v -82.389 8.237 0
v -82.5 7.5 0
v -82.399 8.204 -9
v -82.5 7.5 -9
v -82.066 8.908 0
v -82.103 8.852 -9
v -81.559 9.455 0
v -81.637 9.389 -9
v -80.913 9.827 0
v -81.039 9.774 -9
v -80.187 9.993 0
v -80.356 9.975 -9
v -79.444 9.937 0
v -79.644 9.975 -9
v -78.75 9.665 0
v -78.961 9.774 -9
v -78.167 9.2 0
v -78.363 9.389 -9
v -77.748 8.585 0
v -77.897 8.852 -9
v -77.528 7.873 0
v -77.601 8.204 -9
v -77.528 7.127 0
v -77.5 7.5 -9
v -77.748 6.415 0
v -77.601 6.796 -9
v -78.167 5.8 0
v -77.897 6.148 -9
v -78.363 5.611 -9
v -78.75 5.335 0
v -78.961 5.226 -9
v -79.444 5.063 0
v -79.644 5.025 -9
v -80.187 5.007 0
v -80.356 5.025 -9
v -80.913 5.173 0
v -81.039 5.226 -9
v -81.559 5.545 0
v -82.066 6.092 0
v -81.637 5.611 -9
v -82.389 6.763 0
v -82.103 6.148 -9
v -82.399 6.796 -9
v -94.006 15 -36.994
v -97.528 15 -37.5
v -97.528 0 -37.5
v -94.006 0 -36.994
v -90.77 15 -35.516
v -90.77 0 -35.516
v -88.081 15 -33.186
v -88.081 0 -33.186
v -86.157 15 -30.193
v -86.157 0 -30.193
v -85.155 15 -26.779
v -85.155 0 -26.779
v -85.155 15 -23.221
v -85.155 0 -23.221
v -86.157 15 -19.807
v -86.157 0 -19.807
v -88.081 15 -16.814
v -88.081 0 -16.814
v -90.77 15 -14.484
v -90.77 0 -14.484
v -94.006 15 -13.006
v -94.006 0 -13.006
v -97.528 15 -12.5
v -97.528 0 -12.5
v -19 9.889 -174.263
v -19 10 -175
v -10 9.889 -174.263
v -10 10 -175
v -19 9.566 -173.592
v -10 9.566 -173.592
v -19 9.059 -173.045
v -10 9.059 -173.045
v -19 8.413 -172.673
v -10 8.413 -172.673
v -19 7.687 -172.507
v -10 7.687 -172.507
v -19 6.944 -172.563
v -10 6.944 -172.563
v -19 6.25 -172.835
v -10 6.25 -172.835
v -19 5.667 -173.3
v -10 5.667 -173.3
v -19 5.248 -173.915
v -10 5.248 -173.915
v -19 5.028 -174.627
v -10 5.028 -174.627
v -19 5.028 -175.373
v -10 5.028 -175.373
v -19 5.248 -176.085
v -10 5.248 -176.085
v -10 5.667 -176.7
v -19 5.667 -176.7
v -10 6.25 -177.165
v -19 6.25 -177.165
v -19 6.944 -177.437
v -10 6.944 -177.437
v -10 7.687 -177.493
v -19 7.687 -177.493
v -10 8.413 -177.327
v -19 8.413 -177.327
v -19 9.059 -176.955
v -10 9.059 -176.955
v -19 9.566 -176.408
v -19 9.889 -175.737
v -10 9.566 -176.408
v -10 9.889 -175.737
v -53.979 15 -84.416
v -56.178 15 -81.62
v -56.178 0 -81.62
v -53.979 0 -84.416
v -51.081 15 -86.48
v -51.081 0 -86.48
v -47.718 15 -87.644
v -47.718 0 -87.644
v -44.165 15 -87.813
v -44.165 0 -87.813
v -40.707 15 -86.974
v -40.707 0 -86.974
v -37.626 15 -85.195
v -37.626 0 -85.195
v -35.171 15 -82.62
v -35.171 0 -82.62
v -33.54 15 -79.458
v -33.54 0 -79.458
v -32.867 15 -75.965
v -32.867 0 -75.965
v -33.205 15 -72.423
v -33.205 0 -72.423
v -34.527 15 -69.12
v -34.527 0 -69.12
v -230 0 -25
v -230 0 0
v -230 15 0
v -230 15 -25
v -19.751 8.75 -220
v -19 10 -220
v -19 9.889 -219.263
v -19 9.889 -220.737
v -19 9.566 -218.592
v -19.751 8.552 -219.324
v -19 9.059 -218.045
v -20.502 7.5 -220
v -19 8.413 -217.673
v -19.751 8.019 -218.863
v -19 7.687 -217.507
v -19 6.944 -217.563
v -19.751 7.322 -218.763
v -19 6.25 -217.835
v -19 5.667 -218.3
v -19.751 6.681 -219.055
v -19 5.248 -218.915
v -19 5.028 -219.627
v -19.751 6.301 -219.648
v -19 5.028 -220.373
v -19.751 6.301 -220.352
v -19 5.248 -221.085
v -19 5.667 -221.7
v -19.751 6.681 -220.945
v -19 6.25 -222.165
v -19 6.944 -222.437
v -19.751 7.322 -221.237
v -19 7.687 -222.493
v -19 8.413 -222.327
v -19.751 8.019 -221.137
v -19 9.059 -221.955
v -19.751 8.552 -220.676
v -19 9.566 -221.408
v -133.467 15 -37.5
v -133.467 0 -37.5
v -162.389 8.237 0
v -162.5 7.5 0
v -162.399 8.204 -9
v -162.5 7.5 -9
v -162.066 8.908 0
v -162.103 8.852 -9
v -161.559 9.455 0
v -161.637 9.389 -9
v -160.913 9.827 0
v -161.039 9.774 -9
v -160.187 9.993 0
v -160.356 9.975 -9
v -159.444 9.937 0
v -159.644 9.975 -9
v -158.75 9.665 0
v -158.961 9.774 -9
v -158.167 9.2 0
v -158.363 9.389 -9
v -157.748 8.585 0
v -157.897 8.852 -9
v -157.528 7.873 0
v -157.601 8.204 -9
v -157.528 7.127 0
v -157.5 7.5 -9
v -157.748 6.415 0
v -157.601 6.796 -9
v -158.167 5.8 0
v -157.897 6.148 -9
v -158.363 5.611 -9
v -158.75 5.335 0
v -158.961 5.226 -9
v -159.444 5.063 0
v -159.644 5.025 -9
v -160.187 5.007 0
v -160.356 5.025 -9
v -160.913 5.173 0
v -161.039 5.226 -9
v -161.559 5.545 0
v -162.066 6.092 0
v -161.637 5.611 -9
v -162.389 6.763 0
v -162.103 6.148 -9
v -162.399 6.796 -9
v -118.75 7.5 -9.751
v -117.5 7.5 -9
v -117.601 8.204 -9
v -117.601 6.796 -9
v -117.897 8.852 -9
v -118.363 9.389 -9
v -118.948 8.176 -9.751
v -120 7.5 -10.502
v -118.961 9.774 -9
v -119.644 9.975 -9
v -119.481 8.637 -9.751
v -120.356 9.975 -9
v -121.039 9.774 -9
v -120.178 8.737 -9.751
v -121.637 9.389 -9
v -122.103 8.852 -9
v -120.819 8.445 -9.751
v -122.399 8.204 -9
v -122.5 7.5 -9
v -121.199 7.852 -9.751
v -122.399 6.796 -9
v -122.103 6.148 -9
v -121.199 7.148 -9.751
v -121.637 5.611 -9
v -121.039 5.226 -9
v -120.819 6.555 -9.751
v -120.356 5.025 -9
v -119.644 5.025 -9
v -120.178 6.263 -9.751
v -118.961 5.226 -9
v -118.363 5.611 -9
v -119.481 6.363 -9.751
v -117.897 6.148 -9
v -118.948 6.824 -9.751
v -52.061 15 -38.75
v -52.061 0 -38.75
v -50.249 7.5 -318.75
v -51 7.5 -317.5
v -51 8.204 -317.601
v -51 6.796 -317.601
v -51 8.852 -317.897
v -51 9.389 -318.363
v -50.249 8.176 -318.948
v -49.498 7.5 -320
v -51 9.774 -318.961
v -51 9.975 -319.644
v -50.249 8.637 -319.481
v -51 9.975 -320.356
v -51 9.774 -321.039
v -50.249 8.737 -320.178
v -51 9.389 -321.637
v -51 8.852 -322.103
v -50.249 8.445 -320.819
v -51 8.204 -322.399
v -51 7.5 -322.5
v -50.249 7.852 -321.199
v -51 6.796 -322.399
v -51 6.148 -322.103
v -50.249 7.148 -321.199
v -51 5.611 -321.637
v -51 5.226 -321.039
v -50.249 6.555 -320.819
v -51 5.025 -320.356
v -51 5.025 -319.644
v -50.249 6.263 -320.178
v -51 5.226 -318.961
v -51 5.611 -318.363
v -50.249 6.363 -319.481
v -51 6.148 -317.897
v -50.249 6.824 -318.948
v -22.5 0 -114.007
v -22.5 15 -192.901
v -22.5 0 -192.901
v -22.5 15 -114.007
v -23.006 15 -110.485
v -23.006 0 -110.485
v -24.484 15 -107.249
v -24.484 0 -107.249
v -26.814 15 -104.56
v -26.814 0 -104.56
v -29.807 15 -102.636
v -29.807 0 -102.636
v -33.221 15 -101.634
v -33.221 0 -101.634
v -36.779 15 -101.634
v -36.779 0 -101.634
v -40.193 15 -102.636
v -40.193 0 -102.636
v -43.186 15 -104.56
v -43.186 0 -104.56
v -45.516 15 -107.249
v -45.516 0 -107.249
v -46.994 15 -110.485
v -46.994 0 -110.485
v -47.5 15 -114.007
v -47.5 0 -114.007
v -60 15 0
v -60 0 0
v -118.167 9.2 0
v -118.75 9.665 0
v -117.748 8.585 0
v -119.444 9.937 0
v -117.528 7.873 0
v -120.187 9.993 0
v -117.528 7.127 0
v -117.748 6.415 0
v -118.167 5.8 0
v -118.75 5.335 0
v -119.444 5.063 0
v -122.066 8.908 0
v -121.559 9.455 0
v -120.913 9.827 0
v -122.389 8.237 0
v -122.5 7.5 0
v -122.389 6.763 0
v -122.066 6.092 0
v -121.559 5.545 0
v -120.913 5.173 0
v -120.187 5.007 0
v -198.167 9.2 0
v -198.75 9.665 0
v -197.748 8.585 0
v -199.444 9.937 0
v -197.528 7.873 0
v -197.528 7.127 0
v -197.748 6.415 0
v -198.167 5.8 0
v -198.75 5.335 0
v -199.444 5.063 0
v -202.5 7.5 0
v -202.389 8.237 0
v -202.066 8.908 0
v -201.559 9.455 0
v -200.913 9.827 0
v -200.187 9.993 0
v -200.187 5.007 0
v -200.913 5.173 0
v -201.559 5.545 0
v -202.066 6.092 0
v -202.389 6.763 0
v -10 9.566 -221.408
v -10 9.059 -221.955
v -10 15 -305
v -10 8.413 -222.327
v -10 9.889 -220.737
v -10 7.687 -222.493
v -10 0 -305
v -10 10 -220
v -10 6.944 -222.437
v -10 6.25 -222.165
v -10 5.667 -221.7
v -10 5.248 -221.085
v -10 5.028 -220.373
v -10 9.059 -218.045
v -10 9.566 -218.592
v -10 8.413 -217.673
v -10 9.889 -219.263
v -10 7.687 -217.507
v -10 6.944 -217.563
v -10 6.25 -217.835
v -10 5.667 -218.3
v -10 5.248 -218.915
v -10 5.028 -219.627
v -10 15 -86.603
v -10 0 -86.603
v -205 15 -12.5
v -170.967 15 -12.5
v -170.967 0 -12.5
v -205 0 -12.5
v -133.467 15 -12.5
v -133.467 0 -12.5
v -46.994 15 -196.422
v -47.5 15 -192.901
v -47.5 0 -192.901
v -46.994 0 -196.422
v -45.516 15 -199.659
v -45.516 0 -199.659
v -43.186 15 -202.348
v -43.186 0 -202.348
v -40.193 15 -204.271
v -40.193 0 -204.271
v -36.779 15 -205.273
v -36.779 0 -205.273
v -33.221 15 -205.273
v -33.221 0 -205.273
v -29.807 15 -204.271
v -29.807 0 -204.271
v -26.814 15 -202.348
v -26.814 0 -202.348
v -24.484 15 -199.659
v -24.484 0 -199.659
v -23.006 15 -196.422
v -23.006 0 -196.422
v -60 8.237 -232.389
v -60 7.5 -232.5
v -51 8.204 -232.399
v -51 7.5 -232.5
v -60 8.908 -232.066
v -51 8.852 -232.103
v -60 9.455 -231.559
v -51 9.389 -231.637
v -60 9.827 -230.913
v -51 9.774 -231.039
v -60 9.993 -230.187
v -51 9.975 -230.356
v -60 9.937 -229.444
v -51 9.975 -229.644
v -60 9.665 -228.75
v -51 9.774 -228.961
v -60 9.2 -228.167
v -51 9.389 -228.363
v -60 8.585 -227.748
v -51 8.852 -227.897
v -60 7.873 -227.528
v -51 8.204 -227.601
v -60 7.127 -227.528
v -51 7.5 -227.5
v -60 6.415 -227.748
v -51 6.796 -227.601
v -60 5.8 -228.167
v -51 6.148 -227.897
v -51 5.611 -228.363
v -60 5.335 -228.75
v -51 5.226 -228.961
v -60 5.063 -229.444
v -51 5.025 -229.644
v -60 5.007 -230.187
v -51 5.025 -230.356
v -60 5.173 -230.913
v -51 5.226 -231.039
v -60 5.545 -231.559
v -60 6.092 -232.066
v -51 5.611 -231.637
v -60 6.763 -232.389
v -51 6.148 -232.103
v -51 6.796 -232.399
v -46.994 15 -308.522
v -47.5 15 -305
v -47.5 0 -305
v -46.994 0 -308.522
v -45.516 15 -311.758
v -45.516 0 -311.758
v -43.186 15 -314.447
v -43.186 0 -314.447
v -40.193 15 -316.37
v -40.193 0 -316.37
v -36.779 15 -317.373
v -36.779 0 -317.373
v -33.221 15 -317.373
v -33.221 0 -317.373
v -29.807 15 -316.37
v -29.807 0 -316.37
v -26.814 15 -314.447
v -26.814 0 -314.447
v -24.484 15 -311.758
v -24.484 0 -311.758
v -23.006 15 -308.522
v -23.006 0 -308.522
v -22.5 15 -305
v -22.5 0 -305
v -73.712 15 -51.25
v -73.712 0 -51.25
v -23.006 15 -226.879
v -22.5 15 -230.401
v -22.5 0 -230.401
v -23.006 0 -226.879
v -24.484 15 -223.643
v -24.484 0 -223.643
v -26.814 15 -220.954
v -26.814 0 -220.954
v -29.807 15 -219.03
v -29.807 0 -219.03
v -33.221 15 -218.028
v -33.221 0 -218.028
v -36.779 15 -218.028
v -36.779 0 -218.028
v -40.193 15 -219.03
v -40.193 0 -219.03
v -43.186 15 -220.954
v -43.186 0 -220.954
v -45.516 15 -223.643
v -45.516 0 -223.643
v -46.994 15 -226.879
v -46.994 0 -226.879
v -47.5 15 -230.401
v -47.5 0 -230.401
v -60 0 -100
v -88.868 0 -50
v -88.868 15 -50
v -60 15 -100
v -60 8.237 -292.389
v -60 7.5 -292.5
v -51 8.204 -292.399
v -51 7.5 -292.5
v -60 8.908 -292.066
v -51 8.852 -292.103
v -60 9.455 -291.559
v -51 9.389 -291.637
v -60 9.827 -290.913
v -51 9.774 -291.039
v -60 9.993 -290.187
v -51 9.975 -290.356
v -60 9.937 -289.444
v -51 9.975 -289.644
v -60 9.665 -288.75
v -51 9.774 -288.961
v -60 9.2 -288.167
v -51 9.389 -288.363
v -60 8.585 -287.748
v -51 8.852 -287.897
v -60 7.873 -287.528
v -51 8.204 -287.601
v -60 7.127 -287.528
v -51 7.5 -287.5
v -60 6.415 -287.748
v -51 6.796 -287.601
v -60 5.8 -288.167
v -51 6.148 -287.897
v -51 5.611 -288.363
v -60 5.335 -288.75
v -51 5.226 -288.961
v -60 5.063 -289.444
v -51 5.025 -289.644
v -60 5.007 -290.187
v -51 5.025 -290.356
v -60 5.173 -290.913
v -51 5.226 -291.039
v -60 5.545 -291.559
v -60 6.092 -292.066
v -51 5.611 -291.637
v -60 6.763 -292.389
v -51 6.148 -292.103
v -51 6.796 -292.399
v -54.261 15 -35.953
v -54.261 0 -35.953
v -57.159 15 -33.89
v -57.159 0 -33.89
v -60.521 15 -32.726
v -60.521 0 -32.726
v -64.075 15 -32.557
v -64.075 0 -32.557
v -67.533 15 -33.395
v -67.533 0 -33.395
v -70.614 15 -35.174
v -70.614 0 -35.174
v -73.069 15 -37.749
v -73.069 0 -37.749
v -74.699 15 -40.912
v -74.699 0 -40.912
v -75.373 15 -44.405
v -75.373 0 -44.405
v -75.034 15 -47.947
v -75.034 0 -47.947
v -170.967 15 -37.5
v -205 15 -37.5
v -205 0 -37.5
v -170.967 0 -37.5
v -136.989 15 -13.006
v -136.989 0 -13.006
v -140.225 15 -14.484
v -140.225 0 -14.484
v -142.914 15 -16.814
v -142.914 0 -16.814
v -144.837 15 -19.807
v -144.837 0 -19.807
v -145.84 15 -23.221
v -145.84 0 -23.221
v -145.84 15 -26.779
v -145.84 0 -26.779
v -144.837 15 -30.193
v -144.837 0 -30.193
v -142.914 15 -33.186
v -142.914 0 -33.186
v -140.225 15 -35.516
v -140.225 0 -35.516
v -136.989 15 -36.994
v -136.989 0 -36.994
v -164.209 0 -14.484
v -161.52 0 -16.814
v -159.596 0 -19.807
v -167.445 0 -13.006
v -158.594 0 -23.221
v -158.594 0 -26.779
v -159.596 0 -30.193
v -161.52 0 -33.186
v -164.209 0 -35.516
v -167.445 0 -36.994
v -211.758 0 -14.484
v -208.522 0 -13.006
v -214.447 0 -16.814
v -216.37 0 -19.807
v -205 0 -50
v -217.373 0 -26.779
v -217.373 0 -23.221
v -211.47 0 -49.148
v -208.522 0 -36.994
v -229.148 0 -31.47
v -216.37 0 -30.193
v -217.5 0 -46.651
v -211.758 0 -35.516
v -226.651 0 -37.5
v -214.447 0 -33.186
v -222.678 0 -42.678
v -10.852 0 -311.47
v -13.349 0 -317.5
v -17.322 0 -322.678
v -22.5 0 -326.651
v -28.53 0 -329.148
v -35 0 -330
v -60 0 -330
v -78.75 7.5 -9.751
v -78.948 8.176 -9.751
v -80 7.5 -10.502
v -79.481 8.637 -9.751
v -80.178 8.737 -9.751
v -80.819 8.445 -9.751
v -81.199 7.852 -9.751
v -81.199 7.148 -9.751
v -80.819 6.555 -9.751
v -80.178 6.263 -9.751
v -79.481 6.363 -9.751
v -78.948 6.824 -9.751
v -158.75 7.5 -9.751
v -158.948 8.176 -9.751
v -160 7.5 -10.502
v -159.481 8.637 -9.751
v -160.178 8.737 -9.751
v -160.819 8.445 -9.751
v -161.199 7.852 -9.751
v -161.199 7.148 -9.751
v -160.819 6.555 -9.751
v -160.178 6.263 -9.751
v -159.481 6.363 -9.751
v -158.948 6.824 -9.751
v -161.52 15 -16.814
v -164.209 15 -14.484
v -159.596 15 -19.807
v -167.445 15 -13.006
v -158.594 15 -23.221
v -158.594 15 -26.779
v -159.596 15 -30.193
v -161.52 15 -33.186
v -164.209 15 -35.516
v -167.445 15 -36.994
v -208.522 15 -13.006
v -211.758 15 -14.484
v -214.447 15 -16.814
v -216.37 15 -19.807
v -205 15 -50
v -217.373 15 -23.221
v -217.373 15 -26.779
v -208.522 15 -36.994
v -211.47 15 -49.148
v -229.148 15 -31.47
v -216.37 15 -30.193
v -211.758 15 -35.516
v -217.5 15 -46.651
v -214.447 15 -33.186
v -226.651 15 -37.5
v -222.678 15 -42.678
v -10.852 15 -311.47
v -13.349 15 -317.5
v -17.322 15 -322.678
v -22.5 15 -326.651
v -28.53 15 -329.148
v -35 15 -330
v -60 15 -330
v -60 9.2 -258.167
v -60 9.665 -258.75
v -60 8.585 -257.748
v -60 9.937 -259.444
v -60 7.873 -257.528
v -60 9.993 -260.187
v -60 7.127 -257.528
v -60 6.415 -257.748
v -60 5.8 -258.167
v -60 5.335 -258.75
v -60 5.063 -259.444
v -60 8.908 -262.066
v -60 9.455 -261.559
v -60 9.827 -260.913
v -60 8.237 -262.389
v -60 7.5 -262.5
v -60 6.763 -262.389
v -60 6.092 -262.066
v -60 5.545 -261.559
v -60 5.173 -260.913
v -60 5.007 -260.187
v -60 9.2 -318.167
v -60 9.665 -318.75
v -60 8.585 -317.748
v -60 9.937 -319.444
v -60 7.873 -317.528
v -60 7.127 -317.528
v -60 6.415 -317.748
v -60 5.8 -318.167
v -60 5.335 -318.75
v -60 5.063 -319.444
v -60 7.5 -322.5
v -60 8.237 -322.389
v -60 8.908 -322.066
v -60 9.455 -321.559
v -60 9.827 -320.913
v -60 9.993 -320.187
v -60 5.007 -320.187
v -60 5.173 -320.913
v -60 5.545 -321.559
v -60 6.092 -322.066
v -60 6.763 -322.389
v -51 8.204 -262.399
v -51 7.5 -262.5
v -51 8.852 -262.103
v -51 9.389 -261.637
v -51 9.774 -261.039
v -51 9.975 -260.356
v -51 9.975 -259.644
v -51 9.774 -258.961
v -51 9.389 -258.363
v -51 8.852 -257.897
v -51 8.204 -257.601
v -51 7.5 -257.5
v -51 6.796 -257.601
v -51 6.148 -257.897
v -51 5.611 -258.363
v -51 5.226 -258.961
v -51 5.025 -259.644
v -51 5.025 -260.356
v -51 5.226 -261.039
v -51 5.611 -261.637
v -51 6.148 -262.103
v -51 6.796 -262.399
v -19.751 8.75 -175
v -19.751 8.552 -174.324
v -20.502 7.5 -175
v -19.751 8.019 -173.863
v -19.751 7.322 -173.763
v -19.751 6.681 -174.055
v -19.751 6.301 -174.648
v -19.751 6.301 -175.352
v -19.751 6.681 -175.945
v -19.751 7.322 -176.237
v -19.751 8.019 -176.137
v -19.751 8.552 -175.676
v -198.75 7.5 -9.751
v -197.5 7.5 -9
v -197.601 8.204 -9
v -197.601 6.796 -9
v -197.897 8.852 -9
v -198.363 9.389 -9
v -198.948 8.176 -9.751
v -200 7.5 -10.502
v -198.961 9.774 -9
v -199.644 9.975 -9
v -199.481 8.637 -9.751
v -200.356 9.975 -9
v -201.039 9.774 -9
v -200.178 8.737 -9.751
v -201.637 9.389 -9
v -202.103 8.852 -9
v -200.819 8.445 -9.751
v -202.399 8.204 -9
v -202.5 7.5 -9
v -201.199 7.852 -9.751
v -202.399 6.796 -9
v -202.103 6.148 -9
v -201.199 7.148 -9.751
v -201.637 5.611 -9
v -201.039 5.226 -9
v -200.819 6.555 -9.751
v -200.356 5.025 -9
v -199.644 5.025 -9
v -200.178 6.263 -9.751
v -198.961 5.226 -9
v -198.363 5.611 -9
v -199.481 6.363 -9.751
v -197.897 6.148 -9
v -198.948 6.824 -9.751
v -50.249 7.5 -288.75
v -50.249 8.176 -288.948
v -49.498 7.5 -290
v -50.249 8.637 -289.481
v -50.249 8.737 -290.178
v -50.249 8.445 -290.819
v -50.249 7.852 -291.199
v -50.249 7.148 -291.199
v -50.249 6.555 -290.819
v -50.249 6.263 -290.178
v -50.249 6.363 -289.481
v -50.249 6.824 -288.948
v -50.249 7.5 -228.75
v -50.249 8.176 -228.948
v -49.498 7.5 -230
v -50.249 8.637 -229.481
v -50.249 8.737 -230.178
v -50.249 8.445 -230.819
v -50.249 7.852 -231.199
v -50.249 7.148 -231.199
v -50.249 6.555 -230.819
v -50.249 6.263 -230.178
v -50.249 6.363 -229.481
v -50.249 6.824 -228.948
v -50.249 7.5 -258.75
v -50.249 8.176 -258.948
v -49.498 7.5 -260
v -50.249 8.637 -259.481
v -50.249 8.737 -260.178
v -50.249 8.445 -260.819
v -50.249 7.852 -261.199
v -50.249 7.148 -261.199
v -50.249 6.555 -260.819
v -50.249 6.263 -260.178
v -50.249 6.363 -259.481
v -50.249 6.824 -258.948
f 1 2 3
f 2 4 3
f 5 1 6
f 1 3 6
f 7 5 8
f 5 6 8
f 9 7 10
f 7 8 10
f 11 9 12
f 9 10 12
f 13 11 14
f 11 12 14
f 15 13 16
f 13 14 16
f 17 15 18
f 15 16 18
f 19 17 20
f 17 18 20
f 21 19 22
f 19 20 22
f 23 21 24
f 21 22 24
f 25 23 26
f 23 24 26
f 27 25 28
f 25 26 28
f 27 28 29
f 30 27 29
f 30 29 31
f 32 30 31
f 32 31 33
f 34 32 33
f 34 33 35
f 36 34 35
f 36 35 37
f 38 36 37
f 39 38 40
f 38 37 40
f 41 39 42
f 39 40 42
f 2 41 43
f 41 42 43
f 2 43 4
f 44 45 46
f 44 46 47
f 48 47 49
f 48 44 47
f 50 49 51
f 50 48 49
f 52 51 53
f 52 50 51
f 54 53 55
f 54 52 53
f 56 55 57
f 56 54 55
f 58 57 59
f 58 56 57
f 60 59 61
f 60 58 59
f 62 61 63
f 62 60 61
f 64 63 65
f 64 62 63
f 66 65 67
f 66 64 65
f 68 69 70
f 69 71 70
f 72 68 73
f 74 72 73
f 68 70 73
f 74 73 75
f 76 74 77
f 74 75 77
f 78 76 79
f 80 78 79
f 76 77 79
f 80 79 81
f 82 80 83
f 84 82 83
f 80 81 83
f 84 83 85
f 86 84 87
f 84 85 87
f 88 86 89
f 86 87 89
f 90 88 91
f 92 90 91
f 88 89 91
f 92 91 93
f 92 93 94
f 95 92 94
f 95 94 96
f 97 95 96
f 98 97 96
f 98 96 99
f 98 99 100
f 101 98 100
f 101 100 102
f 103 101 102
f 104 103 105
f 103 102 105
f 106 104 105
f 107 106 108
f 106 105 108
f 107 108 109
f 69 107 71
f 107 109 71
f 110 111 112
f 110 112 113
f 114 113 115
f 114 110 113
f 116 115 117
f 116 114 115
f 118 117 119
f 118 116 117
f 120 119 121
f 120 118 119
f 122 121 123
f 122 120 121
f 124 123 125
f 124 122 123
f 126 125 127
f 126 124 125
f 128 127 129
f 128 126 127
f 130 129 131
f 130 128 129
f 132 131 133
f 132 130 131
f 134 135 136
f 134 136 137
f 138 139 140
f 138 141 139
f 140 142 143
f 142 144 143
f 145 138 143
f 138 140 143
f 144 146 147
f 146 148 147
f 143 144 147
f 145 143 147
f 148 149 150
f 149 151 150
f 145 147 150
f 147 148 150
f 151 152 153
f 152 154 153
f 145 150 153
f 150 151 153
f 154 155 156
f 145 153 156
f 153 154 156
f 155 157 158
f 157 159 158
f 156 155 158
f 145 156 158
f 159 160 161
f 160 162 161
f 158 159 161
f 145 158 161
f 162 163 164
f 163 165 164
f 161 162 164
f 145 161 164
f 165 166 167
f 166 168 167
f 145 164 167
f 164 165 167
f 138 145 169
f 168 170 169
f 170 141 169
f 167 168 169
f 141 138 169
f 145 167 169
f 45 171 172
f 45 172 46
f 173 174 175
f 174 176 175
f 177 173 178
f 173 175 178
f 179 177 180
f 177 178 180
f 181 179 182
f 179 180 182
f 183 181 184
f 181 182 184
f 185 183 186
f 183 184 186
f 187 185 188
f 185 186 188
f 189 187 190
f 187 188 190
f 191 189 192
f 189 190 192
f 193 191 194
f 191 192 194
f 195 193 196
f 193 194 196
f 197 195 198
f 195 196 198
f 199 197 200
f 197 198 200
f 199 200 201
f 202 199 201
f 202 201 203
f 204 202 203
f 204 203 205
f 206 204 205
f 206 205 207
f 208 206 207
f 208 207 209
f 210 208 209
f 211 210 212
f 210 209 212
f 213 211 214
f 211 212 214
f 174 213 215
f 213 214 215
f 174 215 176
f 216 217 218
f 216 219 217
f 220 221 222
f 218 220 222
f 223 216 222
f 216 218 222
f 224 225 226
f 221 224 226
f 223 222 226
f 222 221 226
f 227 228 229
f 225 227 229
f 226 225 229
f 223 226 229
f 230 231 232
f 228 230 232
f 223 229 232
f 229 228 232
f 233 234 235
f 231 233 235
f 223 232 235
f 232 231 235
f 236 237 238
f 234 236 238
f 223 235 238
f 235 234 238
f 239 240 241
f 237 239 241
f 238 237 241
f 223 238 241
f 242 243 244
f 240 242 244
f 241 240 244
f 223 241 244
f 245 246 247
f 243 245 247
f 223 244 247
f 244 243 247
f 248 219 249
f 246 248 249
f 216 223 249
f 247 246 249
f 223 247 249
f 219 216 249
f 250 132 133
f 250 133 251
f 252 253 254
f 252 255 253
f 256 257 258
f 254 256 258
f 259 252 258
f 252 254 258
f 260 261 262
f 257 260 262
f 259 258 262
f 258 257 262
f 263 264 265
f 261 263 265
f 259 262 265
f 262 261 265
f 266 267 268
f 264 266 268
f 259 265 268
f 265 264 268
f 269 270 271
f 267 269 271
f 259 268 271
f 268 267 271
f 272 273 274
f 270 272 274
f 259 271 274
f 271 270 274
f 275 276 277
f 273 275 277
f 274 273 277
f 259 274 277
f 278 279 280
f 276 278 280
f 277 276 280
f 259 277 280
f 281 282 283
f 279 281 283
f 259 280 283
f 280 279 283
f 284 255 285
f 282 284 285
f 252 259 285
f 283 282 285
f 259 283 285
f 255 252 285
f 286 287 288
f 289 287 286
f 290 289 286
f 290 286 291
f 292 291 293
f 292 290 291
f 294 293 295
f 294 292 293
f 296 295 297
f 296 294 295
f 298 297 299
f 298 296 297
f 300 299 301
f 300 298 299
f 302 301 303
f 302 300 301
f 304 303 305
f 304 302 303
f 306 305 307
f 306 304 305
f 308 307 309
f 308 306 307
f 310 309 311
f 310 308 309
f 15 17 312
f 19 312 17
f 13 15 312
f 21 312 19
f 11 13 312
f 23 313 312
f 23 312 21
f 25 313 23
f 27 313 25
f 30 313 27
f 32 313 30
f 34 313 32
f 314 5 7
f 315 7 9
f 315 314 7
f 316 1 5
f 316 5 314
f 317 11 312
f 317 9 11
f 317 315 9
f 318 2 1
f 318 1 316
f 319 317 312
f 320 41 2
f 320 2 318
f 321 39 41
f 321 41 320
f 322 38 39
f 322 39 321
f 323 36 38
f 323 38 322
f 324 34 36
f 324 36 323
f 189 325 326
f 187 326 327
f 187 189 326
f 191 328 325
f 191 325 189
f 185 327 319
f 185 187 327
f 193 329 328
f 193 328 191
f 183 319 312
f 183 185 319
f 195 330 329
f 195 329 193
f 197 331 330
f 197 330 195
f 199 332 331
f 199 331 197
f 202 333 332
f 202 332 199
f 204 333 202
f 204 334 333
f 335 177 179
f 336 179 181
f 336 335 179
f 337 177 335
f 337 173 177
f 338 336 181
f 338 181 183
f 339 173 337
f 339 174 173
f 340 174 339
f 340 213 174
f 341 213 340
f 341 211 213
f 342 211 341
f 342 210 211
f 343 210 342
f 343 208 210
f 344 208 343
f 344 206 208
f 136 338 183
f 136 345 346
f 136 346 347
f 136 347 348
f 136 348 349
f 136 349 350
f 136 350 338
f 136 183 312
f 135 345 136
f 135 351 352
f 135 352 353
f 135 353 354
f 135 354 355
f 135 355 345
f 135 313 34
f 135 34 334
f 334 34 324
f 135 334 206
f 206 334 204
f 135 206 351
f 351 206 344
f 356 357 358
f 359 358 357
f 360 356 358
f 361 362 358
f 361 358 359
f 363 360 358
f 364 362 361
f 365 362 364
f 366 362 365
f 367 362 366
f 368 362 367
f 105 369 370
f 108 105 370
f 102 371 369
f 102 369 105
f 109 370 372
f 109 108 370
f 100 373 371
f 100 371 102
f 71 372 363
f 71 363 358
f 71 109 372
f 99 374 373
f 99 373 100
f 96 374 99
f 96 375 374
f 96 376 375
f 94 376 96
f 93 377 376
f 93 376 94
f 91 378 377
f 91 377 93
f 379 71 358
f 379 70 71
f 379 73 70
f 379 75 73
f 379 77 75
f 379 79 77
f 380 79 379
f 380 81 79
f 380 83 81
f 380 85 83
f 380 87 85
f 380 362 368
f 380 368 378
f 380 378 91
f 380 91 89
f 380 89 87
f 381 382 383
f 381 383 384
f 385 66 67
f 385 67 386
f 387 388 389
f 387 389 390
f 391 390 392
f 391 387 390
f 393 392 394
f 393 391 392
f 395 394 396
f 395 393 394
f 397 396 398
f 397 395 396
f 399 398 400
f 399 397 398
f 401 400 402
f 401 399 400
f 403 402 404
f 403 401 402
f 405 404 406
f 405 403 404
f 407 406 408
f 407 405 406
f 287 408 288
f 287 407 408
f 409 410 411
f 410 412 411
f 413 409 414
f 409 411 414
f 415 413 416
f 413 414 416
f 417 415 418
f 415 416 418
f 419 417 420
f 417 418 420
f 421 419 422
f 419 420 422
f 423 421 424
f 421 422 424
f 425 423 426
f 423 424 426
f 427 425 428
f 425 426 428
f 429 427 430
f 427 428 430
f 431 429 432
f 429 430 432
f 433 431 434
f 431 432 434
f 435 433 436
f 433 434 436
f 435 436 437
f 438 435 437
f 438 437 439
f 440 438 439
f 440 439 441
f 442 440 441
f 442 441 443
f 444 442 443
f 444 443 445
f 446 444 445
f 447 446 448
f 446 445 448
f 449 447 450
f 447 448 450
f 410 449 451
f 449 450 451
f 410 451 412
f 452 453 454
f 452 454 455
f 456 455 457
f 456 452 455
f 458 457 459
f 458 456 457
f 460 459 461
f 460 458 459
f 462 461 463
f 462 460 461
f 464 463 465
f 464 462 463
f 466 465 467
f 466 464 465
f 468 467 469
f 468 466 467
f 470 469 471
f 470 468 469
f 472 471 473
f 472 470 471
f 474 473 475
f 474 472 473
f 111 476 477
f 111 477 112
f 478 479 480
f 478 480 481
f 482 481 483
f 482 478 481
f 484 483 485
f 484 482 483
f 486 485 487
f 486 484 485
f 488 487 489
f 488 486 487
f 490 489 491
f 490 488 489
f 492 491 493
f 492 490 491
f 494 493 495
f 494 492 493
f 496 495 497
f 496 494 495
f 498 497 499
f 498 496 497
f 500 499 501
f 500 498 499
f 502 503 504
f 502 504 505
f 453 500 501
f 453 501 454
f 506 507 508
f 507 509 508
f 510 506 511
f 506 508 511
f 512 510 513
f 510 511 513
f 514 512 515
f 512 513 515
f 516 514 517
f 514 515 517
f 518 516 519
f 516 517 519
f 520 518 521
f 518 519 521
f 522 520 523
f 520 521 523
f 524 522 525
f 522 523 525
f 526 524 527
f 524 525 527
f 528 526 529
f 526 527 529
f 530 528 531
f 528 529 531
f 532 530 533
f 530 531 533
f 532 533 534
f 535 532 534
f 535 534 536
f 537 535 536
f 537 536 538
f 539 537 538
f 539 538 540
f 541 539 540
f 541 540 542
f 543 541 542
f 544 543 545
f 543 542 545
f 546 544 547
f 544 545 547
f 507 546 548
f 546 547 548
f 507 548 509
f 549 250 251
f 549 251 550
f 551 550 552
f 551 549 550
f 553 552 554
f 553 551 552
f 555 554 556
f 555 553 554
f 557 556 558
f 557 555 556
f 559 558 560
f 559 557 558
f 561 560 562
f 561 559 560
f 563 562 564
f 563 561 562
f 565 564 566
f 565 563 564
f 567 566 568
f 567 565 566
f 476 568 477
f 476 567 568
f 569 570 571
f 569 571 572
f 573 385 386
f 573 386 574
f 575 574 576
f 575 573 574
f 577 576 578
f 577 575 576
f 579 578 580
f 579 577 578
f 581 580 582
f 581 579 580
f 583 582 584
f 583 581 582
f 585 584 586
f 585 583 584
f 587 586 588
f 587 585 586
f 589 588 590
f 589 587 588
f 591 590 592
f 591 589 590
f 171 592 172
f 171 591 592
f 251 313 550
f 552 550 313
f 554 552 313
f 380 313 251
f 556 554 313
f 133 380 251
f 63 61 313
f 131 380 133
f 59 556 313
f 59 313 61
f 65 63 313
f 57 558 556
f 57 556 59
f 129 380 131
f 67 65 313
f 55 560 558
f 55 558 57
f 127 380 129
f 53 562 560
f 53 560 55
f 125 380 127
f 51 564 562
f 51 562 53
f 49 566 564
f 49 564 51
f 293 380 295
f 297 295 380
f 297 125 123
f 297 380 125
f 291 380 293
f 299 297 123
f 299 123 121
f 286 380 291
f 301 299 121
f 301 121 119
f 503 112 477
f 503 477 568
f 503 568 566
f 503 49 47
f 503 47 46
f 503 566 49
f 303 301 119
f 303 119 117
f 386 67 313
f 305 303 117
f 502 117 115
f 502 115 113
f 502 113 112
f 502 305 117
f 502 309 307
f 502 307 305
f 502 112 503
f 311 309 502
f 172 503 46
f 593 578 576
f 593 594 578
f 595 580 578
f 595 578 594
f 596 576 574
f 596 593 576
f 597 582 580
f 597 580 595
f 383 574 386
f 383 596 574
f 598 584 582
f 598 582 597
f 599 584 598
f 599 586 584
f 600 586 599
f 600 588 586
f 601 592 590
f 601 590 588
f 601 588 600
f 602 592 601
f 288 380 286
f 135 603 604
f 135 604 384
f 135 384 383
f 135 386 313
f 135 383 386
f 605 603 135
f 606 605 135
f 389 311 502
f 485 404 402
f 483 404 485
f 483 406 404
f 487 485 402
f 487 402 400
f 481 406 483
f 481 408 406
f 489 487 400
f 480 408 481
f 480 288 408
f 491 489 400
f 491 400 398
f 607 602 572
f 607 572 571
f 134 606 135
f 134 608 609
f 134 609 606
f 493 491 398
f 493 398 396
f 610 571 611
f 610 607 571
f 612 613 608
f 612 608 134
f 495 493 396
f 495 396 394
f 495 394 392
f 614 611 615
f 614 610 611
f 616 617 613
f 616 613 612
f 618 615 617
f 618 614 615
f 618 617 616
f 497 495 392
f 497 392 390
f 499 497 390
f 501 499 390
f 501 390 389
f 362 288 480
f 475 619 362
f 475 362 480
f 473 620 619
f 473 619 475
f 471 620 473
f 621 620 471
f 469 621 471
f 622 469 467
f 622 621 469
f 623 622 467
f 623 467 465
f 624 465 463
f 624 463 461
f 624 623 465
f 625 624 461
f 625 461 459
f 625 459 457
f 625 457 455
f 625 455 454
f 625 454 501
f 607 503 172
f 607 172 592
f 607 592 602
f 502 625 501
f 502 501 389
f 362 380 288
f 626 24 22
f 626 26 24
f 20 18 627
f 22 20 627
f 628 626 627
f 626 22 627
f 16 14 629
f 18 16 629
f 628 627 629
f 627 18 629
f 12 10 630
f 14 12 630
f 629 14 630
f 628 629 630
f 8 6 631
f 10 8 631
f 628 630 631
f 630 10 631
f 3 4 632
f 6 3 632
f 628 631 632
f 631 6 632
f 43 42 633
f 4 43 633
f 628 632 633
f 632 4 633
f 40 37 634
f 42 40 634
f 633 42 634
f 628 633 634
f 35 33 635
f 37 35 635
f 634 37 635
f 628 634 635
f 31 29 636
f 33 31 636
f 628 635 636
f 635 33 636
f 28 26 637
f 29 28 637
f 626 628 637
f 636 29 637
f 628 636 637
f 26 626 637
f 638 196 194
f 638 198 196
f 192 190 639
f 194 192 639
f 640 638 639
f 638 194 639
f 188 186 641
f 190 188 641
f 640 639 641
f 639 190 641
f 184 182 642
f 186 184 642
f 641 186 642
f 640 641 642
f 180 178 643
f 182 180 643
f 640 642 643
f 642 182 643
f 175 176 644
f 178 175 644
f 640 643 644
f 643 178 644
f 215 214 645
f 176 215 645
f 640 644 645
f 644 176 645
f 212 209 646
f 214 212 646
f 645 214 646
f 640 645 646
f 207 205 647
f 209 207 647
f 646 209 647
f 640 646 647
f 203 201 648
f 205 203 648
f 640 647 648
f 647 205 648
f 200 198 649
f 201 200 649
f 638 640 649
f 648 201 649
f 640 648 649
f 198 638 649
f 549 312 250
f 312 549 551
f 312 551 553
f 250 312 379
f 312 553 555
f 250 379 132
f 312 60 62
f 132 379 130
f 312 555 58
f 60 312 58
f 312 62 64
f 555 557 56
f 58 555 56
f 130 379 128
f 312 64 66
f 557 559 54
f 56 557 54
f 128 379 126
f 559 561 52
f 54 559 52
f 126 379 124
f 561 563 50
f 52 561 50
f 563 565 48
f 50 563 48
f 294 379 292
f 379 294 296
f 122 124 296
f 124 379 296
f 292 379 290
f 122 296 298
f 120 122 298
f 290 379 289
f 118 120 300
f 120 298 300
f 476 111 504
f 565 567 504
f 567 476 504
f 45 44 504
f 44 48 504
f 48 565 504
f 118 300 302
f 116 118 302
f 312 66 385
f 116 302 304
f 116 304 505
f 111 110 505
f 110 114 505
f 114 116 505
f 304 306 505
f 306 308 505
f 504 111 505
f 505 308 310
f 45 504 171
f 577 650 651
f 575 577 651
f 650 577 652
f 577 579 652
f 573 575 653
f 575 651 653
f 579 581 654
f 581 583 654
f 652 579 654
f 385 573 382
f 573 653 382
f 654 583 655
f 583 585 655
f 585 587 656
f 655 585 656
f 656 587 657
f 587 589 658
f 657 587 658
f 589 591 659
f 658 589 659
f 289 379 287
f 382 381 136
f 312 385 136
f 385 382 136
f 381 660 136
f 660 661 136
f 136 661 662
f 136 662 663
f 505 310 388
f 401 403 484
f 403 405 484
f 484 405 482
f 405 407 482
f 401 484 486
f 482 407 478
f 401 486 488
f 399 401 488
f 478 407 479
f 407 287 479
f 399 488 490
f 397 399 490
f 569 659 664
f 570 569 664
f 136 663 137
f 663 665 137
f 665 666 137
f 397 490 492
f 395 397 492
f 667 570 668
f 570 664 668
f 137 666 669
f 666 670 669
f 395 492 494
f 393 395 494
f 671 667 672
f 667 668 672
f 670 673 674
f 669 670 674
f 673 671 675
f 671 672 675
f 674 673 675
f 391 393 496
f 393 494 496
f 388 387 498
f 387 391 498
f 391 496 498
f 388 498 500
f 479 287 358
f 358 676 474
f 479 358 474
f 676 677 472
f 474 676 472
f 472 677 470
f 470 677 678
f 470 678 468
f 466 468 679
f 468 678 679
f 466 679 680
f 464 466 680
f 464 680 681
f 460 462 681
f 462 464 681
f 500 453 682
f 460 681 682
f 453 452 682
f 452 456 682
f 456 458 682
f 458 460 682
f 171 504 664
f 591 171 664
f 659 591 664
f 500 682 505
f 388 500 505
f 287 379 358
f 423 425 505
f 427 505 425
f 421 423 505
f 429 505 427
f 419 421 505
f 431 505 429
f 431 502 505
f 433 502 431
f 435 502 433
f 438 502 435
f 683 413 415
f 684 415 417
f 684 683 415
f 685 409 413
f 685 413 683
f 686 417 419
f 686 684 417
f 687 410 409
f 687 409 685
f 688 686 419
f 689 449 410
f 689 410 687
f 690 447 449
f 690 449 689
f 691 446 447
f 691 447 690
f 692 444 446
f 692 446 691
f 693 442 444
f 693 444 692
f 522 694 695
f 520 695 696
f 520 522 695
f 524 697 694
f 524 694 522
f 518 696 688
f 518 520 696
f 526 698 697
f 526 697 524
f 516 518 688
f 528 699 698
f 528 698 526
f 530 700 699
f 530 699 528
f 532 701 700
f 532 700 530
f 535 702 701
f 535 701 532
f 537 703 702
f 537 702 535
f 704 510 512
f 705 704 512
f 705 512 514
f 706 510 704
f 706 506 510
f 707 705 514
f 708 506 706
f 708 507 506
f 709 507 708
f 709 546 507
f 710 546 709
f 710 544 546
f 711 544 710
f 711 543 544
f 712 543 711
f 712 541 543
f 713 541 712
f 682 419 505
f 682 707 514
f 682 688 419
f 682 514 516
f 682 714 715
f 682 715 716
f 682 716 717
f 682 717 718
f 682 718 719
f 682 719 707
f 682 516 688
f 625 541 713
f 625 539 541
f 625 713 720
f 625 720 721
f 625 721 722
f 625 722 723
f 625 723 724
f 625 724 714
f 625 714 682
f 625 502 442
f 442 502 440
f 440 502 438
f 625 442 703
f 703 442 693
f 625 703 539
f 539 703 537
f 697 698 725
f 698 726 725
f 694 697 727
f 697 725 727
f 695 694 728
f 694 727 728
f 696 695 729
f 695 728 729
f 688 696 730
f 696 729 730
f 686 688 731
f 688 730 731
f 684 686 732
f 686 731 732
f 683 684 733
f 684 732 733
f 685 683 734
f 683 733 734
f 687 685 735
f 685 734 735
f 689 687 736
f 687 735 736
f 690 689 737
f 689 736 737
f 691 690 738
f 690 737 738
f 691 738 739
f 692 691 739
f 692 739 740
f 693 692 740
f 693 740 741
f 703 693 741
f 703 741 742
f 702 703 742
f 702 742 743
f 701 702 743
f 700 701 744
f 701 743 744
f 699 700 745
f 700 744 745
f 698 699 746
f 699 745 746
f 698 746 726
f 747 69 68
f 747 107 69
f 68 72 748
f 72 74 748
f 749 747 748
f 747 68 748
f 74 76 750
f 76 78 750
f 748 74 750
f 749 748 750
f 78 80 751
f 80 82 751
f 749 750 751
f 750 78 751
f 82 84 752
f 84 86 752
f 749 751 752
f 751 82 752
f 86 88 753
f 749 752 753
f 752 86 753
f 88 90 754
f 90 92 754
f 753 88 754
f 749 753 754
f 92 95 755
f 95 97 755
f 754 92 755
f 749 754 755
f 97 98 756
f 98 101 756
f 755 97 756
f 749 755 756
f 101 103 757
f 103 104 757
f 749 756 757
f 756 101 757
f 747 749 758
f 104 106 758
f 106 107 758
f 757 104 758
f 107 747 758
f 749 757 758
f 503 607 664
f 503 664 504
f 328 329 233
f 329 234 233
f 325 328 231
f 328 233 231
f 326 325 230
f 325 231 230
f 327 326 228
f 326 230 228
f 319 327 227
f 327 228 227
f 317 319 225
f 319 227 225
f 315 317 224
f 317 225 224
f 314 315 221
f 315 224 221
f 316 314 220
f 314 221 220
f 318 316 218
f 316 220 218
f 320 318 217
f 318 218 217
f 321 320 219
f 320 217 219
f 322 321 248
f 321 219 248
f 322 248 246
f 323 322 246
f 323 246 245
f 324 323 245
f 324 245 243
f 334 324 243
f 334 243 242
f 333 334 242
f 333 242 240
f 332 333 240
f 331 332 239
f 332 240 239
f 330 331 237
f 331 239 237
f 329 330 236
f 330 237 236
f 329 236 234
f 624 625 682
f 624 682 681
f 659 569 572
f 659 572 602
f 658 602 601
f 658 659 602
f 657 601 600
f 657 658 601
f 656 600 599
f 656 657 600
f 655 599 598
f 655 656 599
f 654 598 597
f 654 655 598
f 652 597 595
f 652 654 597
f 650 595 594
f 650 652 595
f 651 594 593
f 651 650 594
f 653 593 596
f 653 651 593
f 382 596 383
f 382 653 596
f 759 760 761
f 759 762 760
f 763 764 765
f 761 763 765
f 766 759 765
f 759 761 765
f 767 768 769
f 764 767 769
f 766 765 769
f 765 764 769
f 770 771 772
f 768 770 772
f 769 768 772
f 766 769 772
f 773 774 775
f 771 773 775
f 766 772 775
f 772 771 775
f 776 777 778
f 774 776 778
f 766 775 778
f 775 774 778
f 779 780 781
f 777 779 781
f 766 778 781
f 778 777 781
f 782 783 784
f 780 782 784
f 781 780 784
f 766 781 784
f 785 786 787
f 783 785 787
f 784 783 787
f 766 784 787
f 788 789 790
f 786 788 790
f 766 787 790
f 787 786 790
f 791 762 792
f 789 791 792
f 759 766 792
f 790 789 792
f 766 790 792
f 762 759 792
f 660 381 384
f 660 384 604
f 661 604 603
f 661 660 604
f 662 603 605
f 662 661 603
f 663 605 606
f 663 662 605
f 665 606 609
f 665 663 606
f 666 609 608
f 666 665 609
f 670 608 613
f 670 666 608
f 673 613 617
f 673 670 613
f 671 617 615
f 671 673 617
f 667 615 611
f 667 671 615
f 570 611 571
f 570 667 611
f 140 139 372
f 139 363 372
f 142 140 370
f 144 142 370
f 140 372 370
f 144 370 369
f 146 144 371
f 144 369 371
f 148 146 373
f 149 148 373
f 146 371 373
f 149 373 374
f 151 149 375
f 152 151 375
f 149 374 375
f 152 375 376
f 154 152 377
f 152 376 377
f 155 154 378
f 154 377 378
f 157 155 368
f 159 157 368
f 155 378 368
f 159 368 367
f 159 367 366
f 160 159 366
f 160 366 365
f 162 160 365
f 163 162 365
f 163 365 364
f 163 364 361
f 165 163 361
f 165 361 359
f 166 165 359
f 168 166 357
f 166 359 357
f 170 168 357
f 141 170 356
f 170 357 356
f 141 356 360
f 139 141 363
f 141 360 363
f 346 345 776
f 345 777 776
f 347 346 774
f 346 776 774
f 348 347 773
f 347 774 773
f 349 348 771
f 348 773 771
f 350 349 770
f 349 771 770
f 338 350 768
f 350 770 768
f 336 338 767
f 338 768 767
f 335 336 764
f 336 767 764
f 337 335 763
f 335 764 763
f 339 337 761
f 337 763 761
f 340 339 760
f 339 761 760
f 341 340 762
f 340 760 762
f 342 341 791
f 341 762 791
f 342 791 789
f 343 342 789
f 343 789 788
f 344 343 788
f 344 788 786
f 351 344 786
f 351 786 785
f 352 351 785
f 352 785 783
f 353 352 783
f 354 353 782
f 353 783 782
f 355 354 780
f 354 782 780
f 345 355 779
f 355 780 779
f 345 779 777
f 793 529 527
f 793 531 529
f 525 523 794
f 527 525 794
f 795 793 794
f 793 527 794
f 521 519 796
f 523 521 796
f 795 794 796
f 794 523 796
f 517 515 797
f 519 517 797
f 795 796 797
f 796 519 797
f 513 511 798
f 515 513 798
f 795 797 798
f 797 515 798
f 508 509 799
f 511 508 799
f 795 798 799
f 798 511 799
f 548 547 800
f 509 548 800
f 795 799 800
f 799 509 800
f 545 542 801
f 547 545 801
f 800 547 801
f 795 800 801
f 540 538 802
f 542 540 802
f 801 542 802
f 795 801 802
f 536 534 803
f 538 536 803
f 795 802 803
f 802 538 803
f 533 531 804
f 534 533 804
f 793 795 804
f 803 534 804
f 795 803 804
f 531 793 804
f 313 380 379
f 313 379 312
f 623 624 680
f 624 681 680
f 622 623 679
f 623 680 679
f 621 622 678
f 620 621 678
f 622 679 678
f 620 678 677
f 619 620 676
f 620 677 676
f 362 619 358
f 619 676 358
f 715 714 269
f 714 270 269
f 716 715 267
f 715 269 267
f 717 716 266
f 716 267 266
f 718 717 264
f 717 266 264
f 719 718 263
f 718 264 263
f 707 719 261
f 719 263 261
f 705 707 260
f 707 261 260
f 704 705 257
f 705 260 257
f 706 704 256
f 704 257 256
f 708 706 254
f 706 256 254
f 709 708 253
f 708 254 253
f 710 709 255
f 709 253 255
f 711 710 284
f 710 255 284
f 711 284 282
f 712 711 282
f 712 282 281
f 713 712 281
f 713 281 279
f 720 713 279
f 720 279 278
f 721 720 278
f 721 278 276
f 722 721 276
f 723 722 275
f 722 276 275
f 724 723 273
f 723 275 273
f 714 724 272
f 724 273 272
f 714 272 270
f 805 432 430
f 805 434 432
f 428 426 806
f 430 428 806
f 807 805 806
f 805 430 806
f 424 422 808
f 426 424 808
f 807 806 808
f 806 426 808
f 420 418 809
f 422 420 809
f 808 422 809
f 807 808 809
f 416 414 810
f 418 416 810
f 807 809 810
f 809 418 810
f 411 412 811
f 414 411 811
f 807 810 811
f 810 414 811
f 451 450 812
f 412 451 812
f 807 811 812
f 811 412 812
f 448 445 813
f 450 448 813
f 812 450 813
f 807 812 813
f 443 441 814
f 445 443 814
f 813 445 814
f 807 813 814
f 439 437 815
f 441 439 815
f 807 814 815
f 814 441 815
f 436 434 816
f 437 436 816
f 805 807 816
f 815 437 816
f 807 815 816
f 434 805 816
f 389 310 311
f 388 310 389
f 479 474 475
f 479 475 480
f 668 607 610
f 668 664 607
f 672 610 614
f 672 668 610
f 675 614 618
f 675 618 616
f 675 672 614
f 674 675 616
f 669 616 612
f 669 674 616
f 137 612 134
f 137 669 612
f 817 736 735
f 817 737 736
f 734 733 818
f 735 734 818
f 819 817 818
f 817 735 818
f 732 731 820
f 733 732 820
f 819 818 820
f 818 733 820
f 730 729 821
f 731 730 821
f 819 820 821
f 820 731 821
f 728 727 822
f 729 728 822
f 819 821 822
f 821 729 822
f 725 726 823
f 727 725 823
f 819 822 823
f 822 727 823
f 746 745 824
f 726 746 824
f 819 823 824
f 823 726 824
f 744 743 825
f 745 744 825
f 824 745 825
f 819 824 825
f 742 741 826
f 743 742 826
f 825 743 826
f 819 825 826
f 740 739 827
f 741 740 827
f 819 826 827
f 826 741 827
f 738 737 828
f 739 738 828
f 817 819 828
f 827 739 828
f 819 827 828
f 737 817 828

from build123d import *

# Parameters (mm, degrees)
BOSS_EXTRUDE1_DEPTH             = 15
CUT_EXTRUDE1_DEPTH              = 403.523291252
FILLET1_R                       = 25
TAP_DRILL_FOR_M6X1_0_TAP1_D     = 5
TAP_DRILL_FOR_M6X1_0_TAP1_DEPTH = 9
TAP_DRILL_FOR_M6X1_0_TAP1_TIP   = 1.502151548
TAP_DRILL_FOR_M6X1_0_TAP2_D     = 5
TAP_DRILL_FOR_M6X1_0_TAP2_DEPTH = 9
TAP_DRILL_FOR_M6X1_0_TAP2_TIP   = 1.502151548


# Read off the part's stored shape, not the designer's step: Tap Drill for M6x1.0 Tap3
with BuildPart() as part:
    # Sketch1 → Boss-Extrude1 (new body)
    with BuildSketch(Plane(origin=(0, 0, 0), x_dir=(1, 0, 0), z_dir=(0, 1, 0))):
        Polygon((-230, 50), (-88.867513459, 50), (-60, 100), (-60, 330), (-10, 330), (-10, 86.602540378), (-60, 0), (-230, 0), align=None)
    extrude(amount=BOSS_EXTRUDE1_DEPTH)

    # Sketch2 → Cut-Extrude1 (cut, through all)
    with BuildSketch(Plane(origin=(0, 15, 0), x_dir=(1, 0, 0), z_dir=(0, 1, 0))):
        with BuildLine():
            Line((-133.466878365, 37.5), (-97.527767497, 37.5))
            ThreePointArc((-97.527767497, 37.5), (-85.027767497, 25), (-97.527767497, 12.5))
            Line((-97.527767497, 12.5), (-133.466878365, 12.5))
            ThreePointArc((-133.466878365, 12.5), (-145.966878365, 25), (-133.466878365, 37.5))
        make_face()
        with BuildLine():
            Line((-73.712068893, 51.25), (-56.178079351, 81.619760746))
            ThreePointArc((-56.178079351, 81.619760746), (-39.102761804, 86.195078293), (-34.527444257, 69.119760746))
            Line((-34.527444257, 69.119760746), (-52.061433799, 38.75))
            ThreePointArc((-52.061433799, 38.75), (-69.136751346, 34.174682453), (-73.712068893, 51.25))
        make_face()
        with BuildLine():
            Line((-22.5, 192.900635095), (-22.5, 114.006793797))
            ThreePointArc((-22.5, 114.006793797), (-35, 101.506793797), (-47.5, 114.006793797))
            Line((-47.5, 114.006793797), (-47.5, 192.900635095))
            ThreePointArc((-47.5, 192.900635095), (-35, 205.400635095), (-22.5, 192.900635095))
        make_face()
        with BuildLine():
            Line((-47.5, 230.400635095), (-47.5, 305))
            ThreePointArc((-47.5, 305), (-35, 317.5), (-22.5, 305))
            Line((-22.5, 305), (-22.5, 230.400635095))
            ThreePointArc((-22.5, 230.400635095), (-35, 217.900635095), (-47.5, 230.400635095))
        make_face()
        with BuildLine():
            Line((-205, 37.5), (-170.966878365, 37.5))
            ThreePointArc((-170.966878365, 37.5), (-158.466878365, 25), (-170.966878365, 12.5))
            Line((-170.966878365, 12.5), (-205, 12.5))
            ThreePointArc((-205, 12.5), (-217.5, 25), (-205, 37.5))
        make_face()
    extrude(amount=-CUT_EXTRUDE1_DEPTH, mode=Mode.SUBTRACT)

    # Fillet1
    fillet1_edges = [part.edges().sort_by_distance(p)[0] for p in [
        (-10, 7.5, -330),
        (-230, 7.5, -50),
    ]]
    fillet(fillet1_edges, radius=FILLET1_R)

    # Tap Drill for M6x1.0 Tap1
    with Locations(Plane.XY):
        with Locations((-80, 7.5), (-200, 7.5), (-160, 7.5), (-120, 7.5)):
            Hole(TAP_DRILL_FOR_M6X1_0_TAP1_D / 2, depth=TAP_DRILL_FOR_M6X1_0_TAP1_DEPTH)
            with Locations((0, 0, -(TAP_DRILL_FOR_M6X1_0_TAP1_DEPTH + TAP_DRILL_FOR_M6X1_0_TAP1_TIP / 2))):  # 118° drill point
                Cone(0, TAP_DRILL_FOR_M6X1_0_TAP1_D / 2, TAP_DRILL_FOR_M6X1_0_TAP1_TIP, mode=Mode.SUBTRACT)

    # Tap Drill for M6x1.0 Tap2
    with Locations(Plane.ZY.offset(60)):
        with Locations((-230, 7.5), (-320, 7.5), (-290, 7.5), (-260, 7.5)):
            Hole(TAP_DRILL_FOR_M6X1_0_TAP2_D / 2, depth=TAP_DRILL_FOR_M6X1_0_TAP2_DEPTH)
            with Locations((0, 0, -(TAP_DRILL_FOR_M6X1_0_TAP2_DEPTH + TAP_DRILL_FOR_M6X1_0_TAP2_TIP / 2))):  # 118° drill point
                Cone(0, TAP_DRILL_FOR_M6X1_0_TAP2_D / 2, TAP_DRILL_FOR_M6X1_0_TAP2_TIP, mode=Mode.SUBTRACT)

    # Tap Drill for M6x1.0 Tap3 outline → Tap Drill for M6x1.0 Tap3 (revolve, cut)
    with BuildSketch(Plane(origin=(0, 7.5, -175), x_dir=(0, 1, 0), z_dir=(0, 0, -1))):
        Polygon((0, -10), (0, -20.502151548), (2.5, -19), (2.5, -10), align=None)
    revolve(axis=Axis((0, 7.5, -175), (1, 0, 0)), mode=Mode.SUBTRACT)

    # Tap Drill for M6x1.0 Tap3 2 outline → Tap Drill for M6x1.0 Tap3 2 (revolve, cut)
    with BuildSketch(Plane(origin=(0, 7.5, -220), x_dir=(0, 1, 0), z_dir=(0, 0, -1))):
        Polygon((0, -10), (0, -20.502151548), (2.5, -19), (2.5, -10), align=None)
    revolve(axis=Axis((0, 7.5, -220), (1, 0, 0)), mode=Mode.SUBTRACT)


solid = part.part
